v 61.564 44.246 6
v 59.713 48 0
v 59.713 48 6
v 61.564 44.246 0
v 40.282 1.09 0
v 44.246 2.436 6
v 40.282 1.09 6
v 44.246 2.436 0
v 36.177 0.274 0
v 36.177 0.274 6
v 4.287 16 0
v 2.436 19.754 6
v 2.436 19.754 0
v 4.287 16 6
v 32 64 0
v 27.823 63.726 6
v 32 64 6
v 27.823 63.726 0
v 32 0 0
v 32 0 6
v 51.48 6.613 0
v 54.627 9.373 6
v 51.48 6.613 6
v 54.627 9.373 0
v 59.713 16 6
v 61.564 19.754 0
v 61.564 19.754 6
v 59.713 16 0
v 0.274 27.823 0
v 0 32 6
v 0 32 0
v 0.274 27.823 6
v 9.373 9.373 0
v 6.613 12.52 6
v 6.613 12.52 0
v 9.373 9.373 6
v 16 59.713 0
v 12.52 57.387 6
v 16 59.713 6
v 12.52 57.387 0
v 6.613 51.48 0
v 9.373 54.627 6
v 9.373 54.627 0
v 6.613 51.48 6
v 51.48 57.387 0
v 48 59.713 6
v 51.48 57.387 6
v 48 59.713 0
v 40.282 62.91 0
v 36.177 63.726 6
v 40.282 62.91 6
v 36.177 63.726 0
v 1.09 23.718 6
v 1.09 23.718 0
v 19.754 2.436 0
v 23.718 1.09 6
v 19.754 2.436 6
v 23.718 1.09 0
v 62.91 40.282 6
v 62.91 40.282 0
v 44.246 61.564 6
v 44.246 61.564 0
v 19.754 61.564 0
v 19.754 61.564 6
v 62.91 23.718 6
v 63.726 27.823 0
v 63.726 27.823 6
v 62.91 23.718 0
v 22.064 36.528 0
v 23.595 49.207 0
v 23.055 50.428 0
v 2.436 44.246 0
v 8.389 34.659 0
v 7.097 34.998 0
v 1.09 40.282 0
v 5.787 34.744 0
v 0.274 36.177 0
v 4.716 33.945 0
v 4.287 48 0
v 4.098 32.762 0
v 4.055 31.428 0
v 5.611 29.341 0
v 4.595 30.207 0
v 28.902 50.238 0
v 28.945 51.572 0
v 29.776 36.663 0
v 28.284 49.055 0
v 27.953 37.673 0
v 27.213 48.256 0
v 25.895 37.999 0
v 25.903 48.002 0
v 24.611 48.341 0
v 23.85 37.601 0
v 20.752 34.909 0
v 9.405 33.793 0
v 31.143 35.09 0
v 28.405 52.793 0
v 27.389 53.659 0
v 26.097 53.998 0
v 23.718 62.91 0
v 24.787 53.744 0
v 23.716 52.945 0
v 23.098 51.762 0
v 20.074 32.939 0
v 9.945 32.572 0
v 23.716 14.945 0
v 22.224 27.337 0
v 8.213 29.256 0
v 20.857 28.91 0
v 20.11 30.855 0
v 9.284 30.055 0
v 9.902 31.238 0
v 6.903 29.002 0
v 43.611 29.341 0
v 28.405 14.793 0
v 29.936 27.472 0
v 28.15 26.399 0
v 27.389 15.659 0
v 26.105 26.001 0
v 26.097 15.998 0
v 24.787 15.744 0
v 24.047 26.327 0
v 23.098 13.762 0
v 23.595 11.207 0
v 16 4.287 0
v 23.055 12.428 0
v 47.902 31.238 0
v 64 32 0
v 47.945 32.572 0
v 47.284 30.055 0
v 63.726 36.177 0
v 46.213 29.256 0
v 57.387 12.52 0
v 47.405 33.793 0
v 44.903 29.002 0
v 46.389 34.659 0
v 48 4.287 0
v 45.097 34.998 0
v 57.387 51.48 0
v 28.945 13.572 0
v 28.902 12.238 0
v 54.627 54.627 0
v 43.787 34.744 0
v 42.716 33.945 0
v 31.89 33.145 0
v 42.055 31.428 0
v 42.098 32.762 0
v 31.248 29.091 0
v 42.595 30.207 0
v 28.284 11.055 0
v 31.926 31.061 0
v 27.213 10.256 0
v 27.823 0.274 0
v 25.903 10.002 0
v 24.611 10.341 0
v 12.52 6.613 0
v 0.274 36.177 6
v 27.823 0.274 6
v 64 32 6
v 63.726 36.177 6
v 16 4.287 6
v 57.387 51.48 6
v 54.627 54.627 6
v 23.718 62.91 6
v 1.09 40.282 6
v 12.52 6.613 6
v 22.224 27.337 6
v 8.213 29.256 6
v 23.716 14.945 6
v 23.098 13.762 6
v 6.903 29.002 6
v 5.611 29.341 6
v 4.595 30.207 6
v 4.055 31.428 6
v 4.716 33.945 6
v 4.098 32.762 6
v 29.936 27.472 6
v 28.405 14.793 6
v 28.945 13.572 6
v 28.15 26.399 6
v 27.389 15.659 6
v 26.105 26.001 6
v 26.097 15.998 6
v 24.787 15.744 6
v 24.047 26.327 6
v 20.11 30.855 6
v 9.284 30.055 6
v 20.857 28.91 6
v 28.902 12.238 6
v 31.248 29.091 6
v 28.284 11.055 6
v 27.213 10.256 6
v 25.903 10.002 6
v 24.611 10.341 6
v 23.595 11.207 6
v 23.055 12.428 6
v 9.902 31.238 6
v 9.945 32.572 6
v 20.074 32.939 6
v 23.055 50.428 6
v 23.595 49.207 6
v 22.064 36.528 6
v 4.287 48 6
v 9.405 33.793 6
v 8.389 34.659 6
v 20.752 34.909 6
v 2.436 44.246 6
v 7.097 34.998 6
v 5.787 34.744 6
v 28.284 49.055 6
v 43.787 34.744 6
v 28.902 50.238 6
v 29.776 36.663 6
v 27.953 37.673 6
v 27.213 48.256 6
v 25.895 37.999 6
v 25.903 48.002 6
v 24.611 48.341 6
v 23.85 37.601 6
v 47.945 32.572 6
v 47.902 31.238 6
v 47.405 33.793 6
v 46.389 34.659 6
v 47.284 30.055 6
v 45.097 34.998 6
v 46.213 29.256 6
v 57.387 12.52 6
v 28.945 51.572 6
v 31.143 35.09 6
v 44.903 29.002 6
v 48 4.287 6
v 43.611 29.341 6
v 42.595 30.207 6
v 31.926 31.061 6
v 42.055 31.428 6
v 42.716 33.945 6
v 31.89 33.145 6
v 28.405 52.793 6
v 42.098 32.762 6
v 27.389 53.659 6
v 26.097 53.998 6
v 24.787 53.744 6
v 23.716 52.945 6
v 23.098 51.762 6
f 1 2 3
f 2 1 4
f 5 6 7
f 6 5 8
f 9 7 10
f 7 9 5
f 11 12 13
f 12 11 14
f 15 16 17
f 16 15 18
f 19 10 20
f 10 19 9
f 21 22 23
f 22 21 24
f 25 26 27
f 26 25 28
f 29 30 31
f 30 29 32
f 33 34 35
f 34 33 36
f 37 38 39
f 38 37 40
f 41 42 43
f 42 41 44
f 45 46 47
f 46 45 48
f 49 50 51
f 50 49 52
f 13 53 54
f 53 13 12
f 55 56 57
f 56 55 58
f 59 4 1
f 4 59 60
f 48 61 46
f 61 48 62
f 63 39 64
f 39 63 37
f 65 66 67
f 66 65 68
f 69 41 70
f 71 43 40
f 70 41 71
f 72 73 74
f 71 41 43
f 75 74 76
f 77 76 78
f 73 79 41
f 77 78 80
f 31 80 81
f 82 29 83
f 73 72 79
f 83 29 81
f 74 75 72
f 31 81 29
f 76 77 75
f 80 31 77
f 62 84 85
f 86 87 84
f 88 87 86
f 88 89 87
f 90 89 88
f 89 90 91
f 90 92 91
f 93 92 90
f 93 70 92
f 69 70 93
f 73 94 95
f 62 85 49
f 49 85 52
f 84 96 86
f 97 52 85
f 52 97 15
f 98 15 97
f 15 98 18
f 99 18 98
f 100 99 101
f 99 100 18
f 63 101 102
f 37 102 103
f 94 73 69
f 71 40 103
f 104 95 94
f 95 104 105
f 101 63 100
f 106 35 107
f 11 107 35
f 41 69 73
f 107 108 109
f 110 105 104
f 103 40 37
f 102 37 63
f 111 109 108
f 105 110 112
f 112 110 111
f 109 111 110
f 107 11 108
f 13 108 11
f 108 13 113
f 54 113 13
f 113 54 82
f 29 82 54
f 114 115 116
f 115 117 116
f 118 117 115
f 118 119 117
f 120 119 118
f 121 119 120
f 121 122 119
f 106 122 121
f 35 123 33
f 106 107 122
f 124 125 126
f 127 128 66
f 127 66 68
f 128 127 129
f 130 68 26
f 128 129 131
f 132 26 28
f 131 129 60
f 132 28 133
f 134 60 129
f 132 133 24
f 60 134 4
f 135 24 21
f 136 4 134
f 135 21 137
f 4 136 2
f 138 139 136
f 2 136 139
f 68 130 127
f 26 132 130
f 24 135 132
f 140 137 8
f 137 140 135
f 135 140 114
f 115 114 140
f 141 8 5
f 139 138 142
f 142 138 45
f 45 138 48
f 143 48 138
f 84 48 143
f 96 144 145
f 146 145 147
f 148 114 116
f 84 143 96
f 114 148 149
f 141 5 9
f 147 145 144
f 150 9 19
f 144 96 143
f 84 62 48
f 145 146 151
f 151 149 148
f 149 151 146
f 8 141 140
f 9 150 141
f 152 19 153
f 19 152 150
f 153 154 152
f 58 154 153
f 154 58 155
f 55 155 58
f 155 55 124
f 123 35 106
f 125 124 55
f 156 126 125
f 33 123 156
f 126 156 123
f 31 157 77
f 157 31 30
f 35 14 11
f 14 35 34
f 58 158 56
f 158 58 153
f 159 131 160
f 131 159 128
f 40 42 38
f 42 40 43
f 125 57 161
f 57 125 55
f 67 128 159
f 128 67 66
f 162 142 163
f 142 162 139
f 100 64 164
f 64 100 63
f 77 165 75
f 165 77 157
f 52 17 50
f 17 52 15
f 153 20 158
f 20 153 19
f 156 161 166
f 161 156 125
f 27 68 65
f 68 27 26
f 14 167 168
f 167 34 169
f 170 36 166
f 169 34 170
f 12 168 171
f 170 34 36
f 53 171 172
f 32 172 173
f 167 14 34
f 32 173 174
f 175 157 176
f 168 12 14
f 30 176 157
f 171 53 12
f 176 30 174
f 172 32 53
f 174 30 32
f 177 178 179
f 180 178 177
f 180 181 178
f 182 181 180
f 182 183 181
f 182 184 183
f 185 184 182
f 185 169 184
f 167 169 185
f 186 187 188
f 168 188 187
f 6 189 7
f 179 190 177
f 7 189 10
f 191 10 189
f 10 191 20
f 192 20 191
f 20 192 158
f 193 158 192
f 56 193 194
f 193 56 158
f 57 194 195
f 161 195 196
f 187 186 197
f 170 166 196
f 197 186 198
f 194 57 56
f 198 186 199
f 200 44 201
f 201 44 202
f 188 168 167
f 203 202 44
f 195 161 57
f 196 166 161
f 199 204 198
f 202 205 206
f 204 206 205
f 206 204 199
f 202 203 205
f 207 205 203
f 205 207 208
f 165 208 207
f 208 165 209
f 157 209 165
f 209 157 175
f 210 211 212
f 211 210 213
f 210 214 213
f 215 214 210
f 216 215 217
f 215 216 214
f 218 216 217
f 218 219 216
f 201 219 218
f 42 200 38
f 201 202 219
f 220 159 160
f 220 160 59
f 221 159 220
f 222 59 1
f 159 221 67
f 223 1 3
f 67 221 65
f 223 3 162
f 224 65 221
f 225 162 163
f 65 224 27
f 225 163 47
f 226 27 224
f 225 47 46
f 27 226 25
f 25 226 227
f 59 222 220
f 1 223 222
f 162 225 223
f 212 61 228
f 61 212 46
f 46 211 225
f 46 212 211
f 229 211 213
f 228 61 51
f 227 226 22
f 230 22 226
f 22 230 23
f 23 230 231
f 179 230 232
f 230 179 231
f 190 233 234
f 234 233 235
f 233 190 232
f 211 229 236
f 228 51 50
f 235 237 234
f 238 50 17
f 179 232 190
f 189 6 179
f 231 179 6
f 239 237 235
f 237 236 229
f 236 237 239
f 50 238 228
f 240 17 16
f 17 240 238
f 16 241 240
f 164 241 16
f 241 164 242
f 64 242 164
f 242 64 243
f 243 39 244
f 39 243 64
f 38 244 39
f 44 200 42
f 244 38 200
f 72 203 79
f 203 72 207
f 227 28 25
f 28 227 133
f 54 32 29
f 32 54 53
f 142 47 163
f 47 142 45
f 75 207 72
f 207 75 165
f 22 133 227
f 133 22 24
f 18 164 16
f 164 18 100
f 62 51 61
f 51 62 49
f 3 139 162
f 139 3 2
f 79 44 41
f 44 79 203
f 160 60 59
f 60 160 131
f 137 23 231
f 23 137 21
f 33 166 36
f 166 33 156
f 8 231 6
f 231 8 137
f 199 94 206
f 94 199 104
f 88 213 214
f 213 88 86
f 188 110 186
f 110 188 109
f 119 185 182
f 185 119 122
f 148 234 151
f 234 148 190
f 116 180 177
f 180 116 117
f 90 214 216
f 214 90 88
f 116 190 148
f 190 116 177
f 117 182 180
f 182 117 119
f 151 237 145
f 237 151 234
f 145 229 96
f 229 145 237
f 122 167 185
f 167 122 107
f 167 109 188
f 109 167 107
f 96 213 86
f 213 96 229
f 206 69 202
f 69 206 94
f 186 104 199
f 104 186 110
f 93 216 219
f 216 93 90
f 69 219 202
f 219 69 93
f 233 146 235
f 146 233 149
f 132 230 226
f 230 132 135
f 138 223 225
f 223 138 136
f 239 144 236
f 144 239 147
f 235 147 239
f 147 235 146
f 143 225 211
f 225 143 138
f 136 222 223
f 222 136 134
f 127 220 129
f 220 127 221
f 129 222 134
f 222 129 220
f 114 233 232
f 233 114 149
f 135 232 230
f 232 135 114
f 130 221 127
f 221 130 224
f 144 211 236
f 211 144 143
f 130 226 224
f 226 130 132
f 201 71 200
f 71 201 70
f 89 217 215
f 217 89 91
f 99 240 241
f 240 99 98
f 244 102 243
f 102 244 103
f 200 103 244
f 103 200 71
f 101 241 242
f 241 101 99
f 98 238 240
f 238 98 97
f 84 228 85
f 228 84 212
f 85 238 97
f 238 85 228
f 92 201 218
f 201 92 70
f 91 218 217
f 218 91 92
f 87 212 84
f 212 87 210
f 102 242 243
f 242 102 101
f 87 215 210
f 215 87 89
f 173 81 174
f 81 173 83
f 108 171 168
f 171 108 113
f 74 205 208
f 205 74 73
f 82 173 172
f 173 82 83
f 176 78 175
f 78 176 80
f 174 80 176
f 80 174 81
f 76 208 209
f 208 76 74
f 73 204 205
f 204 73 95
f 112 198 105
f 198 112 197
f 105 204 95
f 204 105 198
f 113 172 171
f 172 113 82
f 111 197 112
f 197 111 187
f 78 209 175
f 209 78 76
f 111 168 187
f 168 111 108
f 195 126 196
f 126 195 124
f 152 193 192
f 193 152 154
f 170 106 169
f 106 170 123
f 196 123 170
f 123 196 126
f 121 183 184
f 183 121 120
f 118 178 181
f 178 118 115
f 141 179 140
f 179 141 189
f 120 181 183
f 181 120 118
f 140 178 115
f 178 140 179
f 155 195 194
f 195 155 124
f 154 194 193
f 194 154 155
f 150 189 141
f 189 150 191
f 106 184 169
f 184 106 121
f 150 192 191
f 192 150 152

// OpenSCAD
$fn = 32;

// ----------------------------------------------------------------------
// Cam plate: eccentric cam, base R32
// ----------------------------------------------------------------------

// --- parameters (mm) ---
base_r = 32;              // base circle radius
lobe_h = 8;               // cam lobe rise
bore_r = 6;               // shaft bore radius
plate_t = 6;              // plate thickness, Z (extrusion height)
ecc = 6;                  // disc eccentricity
ring_r = 19;              // lightening ring radius
bolt_r = 3;               // lightening hole radius
fit_tol = 0.1;            // declared fit tolerance (prompt contract)
free_tol = 0.5;           // declared free tolerance (prompt contract)

profile = [[64, 32], [63.726, 36.177], [62.91, 40.282], [61.564, 44.246], [59.713, 48], [57.387, 51.48], [54.627, 54.627], [51.48, 57.387], [48, 59.713], [44.246, 61.564], [40.282, 62.91], [36.177, 63.726], [32, 64], [27.823, 63.726], [23.718, 62.91], [19.754, 61.564], [16, 59.713], [12.52, 57.387], [9.373, 54.627], [6.613, 51.48], [4.287, 48], [2.436, 44.246], [1.09, 40.282], [0.274, 36.177], [0, 32], [0.274, 27.823], [1.09, 23.718], [2.436, 19.754], [4.287, 16], [6.613, 12.52], [9.373, 9.373], [12.52, 6.613], [16, 4.287], [19.754, 2.436], [23.718, 1.09], [27.823, 0.274], [32, 0], [36.177, 0.274], [40.282, 1.09], [44.246, 2.436], [48, 4.287], [51.48, 6.613], [54.627, 9.373], [57.387, 12.52], [59.713, 16], [61.564, 19.754], [62.91, 23.718], [63.726, 27.823]];  // primary outline, 48 points, counter clockwise
void_1 = [[31.89, 33.145], [31.143, 35.09], [29.776, 36.663], [27.953, 37.673], [25.895, 37.999], [23.85, 37.601], [22.064, 36.528], [20.752, 34.909], [20.074, 32.939], [20.11, 30.855], [20.857, 28.91], [22.224, 27.337], [24.047, 26.327], [26.105, 26.001], [28.15, 26.399], [29.936, 27.472], [31.248, 29.091], [31.926, 31.061]];  // shaft bore, 18 points
void_2 = [[47.945, 32.572], [47.405, 33.793], [46.389, 34.659], [45.097, 34.998], [43.787, 34.744], [42.716, 33.945], [42.098, 32.762], [42.055, 31.428], [42.595, 30.207], [43.611, 29.341], [44.903, 29.002], [46.213, 29.256], [47.284, 30.055], [47.902, 31.238]];  // lightening hole 1, 14 points
void_3 = [[28.945, 51.572], [28.405, 52.793], [27.389, 53.659], [26.097, 53.998], [24.787, 53.744], [23.716, 52.945], [23.098, 51.762], [23.055, 50.428], [23.595, 49.207], [24.611, 48.341], [25.903, 48.002], [27.213, 48.256], [28.284, 49.055], [28.902, 50.238]];  // lightening hole 2, 14 points
void_4 = [[9.945, 32.572], [9.405, 33.793], [8.389, 34.659], [7.097, 34.998], [5.787, 34.744], [4.716, 33.945], [4.098, 32.762], [4.055, 31.428], [4.595, 30.207], [5.611, 29.341], [6.903, 29.002], [8.213, 29.256], [9.284, 30.055], [9.902, 31.238]];  // lightening hole 3, 14 points
void_5 = [[28.945, 13.572], [28.405, 14.793], [27.389, 15.659], [26.097, 15.998], [24.787, 15.744], [23.716, 14.945], [23.098, 13.762], [23.055, 12.428], [23.595, 11.207], [24.611, 10.341], [25.903, 10.002], [27.213, 10.256], [28.284, 11.055], [28.902, 12.238]];  // lightening hole 4, 14 points

// --- the one profile operation ---
difference() {
  linear_extrude(height = plate_t) polygon(points = profile);
  translate([0, 0, -1])
    linear_extrude(height = plate_t + 2) polygon(points = void_1);
  translate([0, 0, -1])
    linear_extrude(height = plate_t + 2) polygon(points = void_2);
  translate([0, 0, -1])
    linear_extrude(height = plate_t + 2) polygon(points = void_3);
  translate([0, 0, -1])
    linear_extrude(height = plate_t + 2) polygon(points = void_4);
  translate([0, 0, -1])
    linear_extrude(height = plate_t + 2) polygon(points = void_5);
}
